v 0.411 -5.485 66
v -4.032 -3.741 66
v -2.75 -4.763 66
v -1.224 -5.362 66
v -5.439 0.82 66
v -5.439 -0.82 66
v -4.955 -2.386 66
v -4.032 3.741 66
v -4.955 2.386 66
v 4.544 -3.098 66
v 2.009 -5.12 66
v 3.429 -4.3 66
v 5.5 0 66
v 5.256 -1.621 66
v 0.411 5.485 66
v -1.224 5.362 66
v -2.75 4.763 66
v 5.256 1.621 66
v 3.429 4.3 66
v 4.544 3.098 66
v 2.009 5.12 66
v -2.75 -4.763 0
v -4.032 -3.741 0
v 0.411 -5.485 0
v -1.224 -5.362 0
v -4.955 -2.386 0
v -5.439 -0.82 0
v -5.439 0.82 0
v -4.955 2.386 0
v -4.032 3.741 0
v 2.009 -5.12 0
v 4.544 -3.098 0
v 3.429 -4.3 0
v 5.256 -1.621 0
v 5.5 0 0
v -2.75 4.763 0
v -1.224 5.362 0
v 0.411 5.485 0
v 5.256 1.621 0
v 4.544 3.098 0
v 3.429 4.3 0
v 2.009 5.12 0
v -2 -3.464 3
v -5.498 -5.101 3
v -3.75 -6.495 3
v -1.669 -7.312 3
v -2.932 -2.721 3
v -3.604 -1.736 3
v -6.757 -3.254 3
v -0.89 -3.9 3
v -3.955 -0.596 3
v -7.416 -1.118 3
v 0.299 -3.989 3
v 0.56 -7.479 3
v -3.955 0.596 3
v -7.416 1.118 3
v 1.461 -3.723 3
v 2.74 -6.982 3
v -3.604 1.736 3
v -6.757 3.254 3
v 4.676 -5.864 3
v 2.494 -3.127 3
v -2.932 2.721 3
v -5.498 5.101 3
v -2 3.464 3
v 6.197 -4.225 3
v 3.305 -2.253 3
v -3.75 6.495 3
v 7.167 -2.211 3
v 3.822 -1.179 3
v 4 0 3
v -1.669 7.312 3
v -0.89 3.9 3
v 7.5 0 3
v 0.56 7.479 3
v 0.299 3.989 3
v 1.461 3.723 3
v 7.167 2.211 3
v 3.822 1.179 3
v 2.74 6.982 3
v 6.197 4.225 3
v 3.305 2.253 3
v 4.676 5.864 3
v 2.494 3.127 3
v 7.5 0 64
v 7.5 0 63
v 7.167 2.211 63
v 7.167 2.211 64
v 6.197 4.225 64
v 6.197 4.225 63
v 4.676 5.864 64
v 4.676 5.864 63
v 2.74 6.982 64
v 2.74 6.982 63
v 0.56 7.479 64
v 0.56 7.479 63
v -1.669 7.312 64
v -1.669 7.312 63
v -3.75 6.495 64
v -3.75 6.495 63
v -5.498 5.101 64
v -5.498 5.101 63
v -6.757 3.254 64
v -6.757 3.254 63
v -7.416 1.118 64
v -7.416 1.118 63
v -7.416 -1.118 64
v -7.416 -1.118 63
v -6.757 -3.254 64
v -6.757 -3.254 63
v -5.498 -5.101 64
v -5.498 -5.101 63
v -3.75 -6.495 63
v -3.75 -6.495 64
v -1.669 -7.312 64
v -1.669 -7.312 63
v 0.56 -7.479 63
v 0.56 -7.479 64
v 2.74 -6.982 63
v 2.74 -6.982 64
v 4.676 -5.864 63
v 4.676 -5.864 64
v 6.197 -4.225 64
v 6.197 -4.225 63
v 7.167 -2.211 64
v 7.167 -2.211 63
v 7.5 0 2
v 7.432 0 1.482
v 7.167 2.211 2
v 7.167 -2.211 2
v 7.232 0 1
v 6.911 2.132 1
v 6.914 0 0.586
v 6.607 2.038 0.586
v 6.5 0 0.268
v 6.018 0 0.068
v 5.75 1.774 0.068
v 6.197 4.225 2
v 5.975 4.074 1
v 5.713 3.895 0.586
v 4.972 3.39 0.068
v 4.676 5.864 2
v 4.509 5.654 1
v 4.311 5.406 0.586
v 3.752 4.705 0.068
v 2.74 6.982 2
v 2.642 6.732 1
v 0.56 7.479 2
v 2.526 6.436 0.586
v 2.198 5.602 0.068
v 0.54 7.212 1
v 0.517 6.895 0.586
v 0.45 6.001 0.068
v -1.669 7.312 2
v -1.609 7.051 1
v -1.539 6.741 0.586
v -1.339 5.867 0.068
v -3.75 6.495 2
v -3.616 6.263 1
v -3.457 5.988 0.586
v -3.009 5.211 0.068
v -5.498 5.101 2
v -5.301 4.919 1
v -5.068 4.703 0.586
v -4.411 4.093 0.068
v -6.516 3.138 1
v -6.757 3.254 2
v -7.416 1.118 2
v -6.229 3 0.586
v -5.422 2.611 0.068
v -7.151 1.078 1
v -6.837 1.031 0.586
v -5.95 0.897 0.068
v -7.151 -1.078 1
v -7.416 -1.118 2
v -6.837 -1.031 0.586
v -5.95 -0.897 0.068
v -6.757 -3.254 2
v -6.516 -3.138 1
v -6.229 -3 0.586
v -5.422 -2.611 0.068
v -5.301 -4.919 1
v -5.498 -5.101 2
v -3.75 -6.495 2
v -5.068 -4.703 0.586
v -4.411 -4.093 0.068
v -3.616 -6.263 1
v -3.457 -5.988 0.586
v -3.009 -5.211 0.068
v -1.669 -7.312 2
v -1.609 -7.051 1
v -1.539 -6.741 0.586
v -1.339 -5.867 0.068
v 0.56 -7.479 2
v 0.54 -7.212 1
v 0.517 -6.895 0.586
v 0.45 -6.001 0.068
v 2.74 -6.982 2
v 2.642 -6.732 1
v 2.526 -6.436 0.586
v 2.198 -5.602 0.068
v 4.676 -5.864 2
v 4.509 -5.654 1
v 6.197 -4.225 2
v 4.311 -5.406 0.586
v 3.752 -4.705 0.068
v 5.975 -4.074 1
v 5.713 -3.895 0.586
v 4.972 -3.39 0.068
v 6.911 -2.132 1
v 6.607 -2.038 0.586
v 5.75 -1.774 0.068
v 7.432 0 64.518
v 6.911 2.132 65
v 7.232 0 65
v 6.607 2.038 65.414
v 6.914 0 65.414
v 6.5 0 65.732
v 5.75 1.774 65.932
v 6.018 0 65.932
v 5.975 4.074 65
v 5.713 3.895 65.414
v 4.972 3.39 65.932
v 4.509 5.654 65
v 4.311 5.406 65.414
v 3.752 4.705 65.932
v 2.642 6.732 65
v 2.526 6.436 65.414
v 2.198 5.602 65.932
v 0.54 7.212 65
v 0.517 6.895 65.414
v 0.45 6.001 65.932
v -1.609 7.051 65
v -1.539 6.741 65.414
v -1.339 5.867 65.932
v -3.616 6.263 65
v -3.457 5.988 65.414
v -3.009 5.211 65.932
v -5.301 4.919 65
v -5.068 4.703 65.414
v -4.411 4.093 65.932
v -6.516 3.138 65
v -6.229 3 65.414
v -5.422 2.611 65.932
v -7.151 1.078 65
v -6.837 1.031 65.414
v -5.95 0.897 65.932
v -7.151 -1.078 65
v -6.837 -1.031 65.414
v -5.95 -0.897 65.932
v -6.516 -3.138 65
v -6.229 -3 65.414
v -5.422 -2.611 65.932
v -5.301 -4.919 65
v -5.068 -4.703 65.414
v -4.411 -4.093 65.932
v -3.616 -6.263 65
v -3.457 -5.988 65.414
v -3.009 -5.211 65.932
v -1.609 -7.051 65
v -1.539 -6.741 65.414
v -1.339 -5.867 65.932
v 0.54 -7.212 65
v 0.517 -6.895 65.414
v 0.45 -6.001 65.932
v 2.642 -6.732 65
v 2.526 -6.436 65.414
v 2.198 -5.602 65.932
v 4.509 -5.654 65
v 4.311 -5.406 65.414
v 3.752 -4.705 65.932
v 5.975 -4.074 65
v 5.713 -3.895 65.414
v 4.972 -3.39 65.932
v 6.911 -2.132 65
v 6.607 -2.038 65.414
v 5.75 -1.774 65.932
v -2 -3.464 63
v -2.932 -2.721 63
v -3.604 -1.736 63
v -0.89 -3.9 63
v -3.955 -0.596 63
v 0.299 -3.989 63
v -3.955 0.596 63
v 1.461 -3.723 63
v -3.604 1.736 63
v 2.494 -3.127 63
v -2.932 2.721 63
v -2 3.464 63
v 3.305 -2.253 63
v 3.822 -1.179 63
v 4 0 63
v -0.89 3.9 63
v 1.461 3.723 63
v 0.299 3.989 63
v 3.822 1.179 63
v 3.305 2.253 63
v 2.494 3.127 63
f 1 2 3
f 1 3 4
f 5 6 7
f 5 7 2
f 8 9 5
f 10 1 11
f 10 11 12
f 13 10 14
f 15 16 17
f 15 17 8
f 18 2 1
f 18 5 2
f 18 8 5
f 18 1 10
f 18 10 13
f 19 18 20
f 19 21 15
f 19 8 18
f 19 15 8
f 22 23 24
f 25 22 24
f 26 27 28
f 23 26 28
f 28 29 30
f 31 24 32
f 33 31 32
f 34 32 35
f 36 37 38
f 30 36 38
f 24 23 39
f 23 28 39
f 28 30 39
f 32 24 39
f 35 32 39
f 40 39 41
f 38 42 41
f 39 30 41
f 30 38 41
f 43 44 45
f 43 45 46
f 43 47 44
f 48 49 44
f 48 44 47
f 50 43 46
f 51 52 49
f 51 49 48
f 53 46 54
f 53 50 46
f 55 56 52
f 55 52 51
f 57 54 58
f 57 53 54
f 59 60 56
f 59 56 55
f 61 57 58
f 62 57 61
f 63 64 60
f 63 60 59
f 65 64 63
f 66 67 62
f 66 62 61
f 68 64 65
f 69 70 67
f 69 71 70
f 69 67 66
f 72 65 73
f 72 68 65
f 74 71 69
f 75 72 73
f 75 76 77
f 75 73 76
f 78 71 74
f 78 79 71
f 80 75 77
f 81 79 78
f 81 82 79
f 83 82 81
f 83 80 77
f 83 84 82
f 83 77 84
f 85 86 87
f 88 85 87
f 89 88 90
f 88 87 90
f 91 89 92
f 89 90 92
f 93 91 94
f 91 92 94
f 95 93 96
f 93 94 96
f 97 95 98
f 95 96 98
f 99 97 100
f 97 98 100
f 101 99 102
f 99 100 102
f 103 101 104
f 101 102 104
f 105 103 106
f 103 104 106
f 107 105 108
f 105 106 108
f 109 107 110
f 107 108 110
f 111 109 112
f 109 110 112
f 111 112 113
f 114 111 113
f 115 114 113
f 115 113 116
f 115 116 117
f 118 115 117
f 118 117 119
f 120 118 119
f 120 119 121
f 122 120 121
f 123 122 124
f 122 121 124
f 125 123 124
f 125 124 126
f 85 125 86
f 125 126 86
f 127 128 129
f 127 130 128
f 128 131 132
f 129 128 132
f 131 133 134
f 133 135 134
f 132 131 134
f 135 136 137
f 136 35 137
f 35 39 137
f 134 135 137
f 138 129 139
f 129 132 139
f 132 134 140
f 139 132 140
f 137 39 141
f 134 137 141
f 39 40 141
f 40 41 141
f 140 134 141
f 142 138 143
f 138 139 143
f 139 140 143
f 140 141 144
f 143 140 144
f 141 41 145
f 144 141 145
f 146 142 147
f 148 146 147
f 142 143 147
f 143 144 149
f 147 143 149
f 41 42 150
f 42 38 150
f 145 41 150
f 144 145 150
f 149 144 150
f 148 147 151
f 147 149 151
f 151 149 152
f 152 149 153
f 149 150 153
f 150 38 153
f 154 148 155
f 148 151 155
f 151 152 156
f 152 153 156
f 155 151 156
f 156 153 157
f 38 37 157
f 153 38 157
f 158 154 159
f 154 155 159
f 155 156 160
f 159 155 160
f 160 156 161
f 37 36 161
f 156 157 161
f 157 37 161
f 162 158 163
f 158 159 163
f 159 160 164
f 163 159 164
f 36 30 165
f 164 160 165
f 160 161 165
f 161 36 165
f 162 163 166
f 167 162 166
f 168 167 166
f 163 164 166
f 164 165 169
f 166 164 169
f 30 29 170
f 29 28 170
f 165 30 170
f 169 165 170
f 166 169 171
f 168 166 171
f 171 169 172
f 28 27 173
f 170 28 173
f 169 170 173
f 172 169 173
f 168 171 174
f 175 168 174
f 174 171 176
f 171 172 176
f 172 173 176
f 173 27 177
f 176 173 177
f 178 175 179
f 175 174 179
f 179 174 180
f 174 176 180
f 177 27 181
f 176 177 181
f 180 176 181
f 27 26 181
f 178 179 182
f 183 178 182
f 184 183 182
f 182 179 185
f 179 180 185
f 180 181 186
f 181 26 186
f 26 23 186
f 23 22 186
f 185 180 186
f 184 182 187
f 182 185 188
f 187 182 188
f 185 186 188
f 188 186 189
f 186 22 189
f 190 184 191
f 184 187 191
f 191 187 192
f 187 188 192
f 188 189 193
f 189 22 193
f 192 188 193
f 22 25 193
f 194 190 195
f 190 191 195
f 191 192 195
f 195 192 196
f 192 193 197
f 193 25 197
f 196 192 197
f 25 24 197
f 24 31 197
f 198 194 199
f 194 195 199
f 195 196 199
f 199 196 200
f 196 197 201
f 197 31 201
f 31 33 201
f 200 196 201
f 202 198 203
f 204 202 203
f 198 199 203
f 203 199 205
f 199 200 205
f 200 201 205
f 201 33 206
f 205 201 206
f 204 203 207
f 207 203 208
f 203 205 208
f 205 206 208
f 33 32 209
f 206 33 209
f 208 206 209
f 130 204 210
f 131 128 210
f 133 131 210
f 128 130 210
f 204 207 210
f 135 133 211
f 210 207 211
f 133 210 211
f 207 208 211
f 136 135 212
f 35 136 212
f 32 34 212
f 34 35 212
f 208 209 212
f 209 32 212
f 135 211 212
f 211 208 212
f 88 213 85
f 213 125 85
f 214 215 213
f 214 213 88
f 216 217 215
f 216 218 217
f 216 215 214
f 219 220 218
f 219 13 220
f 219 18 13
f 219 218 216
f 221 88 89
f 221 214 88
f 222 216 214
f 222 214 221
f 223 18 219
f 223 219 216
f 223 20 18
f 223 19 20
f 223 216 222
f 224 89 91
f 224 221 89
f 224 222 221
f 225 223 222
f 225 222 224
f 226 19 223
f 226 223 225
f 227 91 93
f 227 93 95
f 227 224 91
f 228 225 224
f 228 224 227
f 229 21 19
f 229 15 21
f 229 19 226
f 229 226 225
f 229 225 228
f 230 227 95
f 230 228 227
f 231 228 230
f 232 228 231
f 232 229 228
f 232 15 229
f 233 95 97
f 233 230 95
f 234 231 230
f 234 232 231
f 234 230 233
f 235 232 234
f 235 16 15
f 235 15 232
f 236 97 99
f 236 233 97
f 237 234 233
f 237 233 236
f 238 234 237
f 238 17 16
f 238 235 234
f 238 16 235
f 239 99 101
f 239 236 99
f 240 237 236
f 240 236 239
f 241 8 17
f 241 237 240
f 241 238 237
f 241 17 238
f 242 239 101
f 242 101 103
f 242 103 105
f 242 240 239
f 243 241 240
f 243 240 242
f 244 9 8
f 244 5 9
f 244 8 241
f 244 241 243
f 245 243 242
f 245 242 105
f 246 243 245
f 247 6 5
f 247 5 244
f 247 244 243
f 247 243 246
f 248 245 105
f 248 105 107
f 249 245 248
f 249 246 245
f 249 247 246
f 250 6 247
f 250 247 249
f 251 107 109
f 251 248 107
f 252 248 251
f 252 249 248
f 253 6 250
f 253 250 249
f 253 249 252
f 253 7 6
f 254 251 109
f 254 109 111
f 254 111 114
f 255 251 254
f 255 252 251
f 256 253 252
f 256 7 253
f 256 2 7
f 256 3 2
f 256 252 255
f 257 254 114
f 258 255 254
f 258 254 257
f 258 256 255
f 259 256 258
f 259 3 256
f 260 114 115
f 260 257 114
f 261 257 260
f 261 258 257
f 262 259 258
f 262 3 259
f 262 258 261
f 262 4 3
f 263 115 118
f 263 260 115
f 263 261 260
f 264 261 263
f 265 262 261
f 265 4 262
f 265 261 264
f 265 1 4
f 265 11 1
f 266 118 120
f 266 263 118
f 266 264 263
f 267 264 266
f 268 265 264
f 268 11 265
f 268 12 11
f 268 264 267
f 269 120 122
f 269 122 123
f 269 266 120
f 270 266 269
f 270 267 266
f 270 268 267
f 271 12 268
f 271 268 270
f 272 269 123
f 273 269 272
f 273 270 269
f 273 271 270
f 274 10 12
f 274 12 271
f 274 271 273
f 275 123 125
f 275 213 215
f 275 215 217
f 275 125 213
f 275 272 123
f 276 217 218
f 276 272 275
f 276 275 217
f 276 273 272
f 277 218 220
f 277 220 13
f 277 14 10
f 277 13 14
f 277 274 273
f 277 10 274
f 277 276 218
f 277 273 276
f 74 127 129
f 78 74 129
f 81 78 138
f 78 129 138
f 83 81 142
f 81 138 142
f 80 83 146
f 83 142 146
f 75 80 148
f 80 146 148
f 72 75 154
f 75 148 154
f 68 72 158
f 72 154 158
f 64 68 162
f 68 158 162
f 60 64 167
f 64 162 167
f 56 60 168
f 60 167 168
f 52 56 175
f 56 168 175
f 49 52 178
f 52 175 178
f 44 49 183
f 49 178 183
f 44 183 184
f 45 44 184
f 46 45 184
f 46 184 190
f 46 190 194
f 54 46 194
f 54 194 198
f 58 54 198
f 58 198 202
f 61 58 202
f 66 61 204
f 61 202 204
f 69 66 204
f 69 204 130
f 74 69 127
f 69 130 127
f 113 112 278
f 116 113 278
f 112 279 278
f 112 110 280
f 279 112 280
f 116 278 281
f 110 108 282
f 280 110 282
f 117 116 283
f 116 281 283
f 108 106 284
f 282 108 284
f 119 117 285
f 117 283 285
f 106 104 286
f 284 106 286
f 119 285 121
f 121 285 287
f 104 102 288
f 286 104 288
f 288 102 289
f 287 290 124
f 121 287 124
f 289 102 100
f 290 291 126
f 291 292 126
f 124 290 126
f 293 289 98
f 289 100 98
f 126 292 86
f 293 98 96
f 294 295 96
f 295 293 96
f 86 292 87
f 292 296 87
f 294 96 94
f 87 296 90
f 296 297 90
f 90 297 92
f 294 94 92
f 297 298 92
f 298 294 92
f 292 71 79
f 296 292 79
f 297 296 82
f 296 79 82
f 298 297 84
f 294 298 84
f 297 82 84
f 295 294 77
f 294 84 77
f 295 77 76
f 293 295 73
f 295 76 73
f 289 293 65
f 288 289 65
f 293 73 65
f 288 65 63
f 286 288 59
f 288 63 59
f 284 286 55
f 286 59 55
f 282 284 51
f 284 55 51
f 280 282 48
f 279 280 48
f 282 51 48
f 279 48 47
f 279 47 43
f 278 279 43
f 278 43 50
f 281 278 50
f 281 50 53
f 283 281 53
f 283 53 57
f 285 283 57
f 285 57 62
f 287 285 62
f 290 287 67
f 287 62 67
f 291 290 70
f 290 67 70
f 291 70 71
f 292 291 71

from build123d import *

# Parameters (mm, degrees)
F0_R     = 7.5
F1_DEPTH = 3
F2_R     = 4
F3_DEPTH = 60
F4_R     = 7.5
F5_DEPTH = 3
F6_R     = 2


with BuildPart() as f1:
    # F0 (on Top) → F1 (new body)
    with BuildSketch(Plane.XY):
        Circle(F0_R)
    extrude(amount=F1_DEPTH)

    # F2 (on face) → F3 (join)
    with BuildSketch(Plane.XY.offset(3)):
        Circle(F2_R)
    extrude(amount=F3_DEPTH)

    # F4 (on face) → F5 (join)
    with BuildSketch(Plane.XY.offset(63)):
        Circle(F4_R)
    extrude(amount=F5_DEPTH)

    # F6
    f6_edges = [f1.edges().sort_by_distance(p)[0] for p in [
        (-7.5, 0, 66),
        (-7.5, 0, 0),
    ]]
    fillet(f6_edges, radius=F6_R)


solid = f1.part
